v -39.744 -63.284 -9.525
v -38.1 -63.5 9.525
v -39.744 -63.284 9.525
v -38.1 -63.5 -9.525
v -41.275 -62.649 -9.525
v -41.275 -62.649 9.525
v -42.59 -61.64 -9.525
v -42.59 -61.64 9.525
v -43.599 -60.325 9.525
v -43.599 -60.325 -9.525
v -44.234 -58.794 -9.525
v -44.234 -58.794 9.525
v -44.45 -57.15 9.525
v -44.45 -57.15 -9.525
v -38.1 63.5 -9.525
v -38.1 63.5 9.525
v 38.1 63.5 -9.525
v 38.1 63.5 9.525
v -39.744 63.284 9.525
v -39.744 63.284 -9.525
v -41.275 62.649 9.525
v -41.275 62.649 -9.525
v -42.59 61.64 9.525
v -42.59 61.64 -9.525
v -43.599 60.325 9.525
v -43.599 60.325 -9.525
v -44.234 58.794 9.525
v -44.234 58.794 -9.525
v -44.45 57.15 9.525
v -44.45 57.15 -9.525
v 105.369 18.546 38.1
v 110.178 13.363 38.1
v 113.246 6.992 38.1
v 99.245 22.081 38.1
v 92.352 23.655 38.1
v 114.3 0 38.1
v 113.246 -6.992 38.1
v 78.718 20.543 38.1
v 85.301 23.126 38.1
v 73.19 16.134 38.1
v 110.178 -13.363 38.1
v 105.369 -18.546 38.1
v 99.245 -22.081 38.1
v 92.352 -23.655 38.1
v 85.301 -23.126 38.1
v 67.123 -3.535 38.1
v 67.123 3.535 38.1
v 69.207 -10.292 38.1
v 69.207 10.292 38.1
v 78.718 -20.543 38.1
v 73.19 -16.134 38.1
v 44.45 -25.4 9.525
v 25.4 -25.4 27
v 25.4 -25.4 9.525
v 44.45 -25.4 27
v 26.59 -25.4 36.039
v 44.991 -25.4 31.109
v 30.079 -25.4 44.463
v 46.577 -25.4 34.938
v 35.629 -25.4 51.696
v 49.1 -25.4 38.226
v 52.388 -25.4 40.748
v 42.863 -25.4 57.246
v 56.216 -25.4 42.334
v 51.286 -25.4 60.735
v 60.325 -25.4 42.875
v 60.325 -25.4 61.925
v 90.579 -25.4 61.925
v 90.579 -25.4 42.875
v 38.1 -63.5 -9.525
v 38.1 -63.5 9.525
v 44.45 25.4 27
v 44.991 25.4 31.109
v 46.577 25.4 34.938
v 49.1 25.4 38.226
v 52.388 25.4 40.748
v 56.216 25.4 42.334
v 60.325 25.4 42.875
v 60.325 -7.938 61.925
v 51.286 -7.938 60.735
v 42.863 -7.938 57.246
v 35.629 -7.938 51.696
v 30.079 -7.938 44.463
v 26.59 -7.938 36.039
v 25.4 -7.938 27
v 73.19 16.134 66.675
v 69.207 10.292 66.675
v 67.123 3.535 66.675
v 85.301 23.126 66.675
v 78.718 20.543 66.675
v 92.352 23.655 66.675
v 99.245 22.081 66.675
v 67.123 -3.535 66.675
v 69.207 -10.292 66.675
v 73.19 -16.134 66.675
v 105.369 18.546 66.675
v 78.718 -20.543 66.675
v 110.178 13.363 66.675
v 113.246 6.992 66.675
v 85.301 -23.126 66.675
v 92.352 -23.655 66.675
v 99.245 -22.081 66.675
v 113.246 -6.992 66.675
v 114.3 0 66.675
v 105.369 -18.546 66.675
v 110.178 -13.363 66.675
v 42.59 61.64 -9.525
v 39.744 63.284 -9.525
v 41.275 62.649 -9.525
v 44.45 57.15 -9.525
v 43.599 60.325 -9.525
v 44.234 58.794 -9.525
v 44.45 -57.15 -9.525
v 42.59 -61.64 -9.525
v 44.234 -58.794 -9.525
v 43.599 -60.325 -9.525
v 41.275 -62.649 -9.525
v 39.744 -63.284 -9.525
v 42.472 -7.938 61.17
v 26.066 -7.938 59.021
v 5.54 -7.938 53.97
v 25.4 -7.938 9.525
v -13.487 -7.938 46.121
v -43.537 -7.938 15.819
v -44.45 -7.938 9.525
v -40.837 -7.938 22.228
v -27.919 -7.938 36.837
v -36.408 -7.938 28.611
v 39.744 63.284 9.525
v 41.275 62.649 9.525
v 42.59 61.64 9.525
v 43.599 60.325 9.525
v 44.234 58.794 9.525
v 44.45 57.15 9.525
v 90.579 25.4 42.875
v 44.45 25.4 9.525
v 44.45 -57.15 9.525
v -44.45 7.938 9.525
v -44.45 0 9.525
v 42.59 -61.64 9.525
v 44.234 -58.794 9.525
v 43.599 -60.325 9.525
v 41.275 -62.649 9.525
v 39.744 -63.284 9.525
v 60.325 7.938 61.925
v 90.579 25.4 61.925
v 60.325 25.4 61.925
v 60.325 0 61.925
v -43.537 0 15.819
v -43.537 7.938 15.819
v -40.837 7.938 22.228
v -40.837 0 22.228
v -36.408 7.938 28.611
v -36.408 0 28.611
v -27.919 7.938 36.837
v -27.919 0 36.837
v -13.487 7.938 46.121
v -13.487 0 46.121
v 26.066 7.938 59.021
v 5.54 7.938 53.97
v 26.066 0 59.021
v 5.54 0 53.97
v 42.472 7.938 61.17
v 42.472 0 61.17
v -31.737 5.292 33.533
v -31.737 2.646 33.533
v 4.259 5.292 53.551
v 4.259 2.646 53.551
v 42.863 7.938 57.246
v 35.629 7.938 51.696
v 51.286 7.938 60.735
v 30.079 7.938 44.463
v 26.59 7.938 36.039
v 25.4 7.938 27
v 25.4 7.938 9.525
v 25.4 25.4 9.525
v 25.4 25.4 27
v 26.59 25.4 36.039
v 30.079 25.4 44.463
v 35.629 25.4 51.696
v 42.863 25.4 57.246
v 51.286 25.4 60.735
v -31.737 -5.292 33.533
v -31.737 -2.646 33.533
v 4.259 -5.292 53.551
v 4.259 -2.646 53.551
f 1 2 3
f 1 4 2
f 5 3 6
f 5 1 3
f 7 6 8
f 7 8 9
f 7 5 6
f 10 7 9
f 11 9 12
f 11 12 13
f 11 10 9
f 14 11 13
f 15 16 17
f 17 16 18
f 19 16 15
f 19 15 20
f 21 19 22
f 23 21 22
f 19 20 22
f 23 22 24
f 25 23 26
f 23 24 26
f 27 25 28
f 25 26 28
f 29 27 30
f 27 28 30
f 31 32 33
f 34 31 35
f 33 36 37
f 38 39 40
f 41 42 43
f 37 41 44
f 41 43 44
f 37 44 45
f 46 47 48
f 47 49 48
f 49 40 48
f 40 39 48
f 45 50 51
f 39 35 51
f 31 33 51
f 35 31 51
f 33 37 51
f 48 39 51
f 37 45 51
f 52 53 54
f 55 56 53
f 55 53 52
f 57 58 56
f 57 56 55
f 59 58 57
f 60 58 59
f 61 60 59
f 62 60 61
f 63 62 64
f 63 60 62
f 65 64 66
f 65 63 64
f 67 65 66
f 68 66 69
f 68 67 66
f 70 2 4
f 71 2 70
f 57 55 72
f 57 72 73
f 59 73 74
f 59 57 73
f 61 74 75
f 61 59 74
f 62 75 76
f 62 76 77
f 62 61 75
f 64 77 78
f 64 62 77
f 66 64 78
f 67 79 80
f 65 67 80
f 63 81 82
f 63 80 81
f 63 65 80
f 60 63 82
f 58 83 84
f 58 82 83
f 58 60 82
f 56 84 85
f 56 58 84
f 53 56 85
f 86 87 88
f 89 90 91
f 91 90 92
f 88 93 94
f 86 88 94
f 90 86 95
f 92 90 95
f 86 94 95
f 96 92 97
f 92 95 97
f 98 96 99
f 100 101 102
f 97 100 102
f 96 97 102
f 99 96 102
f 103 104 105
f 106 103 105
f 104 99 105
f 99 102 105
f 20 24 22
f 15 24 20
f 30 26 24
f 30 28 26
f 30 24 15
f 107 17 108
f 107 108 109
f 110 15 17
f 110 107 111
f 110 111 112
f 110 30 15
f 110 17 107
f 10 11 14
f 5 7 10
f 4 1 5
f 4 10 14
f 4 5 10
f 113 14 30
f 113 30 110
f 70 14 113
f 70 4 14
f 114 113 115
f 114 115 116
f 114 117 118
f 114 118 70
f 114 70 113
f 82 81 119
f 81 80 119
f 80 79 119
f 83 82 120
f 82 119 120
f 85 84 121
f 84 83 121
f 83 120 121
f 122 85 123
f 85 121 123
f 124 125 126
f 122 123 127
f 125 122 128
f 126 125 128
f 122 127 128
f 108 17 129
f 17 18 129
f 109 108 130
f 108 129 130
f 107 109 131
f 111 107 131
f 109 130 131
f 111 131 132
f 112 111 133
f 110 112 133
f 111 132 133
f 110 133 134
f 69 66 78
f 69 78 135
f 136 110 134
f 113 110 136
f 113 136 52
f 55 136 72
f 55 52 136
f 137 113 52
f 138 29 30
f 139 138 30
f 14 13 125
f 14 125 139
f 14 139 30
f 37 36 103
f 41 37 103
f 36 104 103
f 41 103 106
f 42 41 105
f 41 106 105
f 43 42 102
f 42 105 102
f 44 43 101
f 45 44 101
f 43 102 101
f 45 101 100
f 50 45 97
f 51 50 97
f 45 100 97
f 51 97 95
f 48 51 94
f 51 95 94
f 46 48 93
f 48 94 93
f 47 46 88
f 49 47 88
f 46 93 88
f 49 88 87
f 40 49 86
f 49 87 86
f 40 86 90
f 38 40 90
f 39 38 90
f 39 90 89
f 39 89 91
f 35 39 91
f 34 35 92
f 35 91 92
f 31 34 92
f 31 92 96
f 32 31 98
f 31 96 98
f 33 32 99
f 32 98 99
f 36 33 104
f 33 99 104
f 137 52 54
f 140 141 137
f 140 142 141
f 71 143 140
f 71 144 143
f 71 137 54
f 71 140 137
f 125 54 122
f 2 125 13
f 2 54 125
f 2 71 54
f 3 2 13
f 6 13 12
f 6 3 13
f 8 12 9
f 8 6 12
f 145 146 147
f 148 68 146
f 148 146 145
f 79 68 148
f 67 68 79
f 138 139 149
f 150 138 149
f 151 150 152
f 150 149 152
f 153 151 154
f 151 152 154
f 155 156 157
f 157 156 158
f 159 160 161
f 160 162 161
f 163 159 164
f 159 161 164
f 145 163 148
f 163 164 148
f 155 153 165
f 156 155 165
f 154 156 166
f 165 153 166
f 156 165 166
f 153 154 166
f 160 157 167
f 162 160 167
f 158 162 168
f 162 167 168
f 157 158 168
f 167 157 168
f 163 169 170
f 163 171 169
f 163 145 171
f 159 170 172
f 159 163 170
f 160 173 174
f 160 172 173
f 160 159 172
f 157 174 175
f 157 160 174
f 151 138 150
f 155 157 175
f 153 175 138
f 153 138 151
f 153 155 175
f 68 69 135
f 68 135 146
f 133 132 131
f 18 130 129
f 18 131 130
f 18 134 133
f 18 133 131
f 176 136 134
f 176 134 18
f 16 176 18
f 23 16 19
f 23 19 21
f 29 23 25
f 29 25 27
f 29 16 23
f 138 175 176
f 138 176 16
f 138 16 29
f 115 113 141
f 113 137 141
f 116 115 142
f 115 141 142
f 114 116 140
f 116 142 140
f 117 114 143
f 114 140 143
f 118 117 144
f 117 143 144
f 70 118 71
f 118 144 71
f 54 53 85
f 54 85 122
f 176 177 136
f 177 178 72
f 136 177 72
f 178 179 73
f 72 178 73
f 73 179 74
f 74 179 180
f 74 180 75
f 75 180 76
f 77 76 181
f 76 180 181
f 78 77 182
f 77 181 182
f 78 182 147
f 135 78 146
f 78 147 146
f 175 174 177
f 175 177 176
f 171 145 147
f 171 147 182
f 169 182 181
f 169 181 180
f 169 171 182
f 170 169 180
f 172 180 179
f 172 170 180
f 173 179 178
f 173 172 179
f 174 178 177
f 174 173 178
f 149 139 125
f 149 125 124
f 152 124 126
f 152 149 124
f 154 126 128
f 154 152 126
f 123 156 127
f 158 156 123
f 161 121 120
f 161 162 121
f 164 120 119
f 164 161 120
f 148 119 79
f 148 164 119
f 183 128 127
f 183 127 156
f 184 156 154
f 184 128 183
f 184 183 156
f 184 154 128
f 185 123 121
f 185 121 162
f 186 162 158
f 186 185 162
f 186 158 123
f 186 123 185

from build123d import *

# Parameters (mm, degrees)
F1_DEPTH = 63.5
F0_W     = 27.0789953068
F0_H     = 19.05
F2_DEPTH = 25.4
F3_DEPTH = 7.9375
F5_R     = 6.35


with BuildPart() as f1:
    # F0 (on Front) → F1 (new body, symmetric)
    with BuildSketch(Plane.XZ):
        Polygon((-44.45, -9.525), (44.45, -9.525), (44.45, 9.525), (25.4, 9.525), (-44.45, 9.525), align=None)
    extrude(amount=F1_DEPTH, both=True)

    # F0 (on Front) → F2 (join, symmetric)
    with BuildSketch(Plane.XZ):
        with BuildLine():
            Line((25.4, 9.525), (44.45, 9.525))
            Line((44.45, 9.525), (44.45, 27.0002))
            ThreePointArc((44.45, 27.0002), (49.0996798487, 38.2255201513), (60.325, 42.8752))
            Line((60.325, 42.8752), (63.5, 42.8752))
            Line((63.5, 42.8752), (63.5, 61.9252))
            Line((63.5, 61.9252), (60.325, 61.9252))
            ThreePointArc((60.325, 61.9252), (35.6292956671, 51.6959043329), (25.4, 27.0002))
            Line((25.4, 27.0002), (25.4, 9.525))
        make_face()
        with Locations((77.0394976534, 52.4002)):
            Rectangle(F0_W, F0_H)
    extrude(amount=F2_DEPTH, both=True)

    # F0 (on Front) → F3 (join, symmetric)
    with BuildSketch(Plane.XZ):
        with BuildLine():
            add(Edge.make_bspline(
                [(-44.45, 9.525), (-44.45, 32.9757705331), (-4.7052279115, 61.9252), (60.325, 61.9252)],
                knots=[0, 0, 0, 0, 117.1476913347, 117.1476913347, 117.1476913347, 117.1476913347], degree=3))
            Line((-44.45, 9.525), (25.4, 9.525))
            Line((25.4, 9.525), (25.4, 27.0002))
            ThreePointArc((25.4, 27.0002), (35.6292956671, 51.6959043329), (60.325, 61.9252))
        make_face()
    extrude(amount=F3_DEPTH, both=True)

    # F5
    f5_edges = [f1.edges().sort_by_distance(p)[0] for p in [
        (44.45, -63.5, 0),
        (-44.45, -63.5, 0),
        (44.45, 63.5, 0),
        (-44.45, 63.5, 0),
    ]]
    fillet(f5_edges, radius=F5_R)


with BuildPart() as f4:
    # F0 (on Front) → F4 (revolve)
    with BuildSketch(Plane.XZ):
        Polygon((90.5789953068, 66.675), (90.5789953068, 61.9252), (90.5789953068, 42.8752), (90.5789953068, 38.1), (114.3, 38.1), (114.3, 66.675), align=None)
    revolve(axis=Axis((90.5789953068, 0, 52.3875), (0, 0, -1)))


solid = Compound([f1.part, f4.part])
